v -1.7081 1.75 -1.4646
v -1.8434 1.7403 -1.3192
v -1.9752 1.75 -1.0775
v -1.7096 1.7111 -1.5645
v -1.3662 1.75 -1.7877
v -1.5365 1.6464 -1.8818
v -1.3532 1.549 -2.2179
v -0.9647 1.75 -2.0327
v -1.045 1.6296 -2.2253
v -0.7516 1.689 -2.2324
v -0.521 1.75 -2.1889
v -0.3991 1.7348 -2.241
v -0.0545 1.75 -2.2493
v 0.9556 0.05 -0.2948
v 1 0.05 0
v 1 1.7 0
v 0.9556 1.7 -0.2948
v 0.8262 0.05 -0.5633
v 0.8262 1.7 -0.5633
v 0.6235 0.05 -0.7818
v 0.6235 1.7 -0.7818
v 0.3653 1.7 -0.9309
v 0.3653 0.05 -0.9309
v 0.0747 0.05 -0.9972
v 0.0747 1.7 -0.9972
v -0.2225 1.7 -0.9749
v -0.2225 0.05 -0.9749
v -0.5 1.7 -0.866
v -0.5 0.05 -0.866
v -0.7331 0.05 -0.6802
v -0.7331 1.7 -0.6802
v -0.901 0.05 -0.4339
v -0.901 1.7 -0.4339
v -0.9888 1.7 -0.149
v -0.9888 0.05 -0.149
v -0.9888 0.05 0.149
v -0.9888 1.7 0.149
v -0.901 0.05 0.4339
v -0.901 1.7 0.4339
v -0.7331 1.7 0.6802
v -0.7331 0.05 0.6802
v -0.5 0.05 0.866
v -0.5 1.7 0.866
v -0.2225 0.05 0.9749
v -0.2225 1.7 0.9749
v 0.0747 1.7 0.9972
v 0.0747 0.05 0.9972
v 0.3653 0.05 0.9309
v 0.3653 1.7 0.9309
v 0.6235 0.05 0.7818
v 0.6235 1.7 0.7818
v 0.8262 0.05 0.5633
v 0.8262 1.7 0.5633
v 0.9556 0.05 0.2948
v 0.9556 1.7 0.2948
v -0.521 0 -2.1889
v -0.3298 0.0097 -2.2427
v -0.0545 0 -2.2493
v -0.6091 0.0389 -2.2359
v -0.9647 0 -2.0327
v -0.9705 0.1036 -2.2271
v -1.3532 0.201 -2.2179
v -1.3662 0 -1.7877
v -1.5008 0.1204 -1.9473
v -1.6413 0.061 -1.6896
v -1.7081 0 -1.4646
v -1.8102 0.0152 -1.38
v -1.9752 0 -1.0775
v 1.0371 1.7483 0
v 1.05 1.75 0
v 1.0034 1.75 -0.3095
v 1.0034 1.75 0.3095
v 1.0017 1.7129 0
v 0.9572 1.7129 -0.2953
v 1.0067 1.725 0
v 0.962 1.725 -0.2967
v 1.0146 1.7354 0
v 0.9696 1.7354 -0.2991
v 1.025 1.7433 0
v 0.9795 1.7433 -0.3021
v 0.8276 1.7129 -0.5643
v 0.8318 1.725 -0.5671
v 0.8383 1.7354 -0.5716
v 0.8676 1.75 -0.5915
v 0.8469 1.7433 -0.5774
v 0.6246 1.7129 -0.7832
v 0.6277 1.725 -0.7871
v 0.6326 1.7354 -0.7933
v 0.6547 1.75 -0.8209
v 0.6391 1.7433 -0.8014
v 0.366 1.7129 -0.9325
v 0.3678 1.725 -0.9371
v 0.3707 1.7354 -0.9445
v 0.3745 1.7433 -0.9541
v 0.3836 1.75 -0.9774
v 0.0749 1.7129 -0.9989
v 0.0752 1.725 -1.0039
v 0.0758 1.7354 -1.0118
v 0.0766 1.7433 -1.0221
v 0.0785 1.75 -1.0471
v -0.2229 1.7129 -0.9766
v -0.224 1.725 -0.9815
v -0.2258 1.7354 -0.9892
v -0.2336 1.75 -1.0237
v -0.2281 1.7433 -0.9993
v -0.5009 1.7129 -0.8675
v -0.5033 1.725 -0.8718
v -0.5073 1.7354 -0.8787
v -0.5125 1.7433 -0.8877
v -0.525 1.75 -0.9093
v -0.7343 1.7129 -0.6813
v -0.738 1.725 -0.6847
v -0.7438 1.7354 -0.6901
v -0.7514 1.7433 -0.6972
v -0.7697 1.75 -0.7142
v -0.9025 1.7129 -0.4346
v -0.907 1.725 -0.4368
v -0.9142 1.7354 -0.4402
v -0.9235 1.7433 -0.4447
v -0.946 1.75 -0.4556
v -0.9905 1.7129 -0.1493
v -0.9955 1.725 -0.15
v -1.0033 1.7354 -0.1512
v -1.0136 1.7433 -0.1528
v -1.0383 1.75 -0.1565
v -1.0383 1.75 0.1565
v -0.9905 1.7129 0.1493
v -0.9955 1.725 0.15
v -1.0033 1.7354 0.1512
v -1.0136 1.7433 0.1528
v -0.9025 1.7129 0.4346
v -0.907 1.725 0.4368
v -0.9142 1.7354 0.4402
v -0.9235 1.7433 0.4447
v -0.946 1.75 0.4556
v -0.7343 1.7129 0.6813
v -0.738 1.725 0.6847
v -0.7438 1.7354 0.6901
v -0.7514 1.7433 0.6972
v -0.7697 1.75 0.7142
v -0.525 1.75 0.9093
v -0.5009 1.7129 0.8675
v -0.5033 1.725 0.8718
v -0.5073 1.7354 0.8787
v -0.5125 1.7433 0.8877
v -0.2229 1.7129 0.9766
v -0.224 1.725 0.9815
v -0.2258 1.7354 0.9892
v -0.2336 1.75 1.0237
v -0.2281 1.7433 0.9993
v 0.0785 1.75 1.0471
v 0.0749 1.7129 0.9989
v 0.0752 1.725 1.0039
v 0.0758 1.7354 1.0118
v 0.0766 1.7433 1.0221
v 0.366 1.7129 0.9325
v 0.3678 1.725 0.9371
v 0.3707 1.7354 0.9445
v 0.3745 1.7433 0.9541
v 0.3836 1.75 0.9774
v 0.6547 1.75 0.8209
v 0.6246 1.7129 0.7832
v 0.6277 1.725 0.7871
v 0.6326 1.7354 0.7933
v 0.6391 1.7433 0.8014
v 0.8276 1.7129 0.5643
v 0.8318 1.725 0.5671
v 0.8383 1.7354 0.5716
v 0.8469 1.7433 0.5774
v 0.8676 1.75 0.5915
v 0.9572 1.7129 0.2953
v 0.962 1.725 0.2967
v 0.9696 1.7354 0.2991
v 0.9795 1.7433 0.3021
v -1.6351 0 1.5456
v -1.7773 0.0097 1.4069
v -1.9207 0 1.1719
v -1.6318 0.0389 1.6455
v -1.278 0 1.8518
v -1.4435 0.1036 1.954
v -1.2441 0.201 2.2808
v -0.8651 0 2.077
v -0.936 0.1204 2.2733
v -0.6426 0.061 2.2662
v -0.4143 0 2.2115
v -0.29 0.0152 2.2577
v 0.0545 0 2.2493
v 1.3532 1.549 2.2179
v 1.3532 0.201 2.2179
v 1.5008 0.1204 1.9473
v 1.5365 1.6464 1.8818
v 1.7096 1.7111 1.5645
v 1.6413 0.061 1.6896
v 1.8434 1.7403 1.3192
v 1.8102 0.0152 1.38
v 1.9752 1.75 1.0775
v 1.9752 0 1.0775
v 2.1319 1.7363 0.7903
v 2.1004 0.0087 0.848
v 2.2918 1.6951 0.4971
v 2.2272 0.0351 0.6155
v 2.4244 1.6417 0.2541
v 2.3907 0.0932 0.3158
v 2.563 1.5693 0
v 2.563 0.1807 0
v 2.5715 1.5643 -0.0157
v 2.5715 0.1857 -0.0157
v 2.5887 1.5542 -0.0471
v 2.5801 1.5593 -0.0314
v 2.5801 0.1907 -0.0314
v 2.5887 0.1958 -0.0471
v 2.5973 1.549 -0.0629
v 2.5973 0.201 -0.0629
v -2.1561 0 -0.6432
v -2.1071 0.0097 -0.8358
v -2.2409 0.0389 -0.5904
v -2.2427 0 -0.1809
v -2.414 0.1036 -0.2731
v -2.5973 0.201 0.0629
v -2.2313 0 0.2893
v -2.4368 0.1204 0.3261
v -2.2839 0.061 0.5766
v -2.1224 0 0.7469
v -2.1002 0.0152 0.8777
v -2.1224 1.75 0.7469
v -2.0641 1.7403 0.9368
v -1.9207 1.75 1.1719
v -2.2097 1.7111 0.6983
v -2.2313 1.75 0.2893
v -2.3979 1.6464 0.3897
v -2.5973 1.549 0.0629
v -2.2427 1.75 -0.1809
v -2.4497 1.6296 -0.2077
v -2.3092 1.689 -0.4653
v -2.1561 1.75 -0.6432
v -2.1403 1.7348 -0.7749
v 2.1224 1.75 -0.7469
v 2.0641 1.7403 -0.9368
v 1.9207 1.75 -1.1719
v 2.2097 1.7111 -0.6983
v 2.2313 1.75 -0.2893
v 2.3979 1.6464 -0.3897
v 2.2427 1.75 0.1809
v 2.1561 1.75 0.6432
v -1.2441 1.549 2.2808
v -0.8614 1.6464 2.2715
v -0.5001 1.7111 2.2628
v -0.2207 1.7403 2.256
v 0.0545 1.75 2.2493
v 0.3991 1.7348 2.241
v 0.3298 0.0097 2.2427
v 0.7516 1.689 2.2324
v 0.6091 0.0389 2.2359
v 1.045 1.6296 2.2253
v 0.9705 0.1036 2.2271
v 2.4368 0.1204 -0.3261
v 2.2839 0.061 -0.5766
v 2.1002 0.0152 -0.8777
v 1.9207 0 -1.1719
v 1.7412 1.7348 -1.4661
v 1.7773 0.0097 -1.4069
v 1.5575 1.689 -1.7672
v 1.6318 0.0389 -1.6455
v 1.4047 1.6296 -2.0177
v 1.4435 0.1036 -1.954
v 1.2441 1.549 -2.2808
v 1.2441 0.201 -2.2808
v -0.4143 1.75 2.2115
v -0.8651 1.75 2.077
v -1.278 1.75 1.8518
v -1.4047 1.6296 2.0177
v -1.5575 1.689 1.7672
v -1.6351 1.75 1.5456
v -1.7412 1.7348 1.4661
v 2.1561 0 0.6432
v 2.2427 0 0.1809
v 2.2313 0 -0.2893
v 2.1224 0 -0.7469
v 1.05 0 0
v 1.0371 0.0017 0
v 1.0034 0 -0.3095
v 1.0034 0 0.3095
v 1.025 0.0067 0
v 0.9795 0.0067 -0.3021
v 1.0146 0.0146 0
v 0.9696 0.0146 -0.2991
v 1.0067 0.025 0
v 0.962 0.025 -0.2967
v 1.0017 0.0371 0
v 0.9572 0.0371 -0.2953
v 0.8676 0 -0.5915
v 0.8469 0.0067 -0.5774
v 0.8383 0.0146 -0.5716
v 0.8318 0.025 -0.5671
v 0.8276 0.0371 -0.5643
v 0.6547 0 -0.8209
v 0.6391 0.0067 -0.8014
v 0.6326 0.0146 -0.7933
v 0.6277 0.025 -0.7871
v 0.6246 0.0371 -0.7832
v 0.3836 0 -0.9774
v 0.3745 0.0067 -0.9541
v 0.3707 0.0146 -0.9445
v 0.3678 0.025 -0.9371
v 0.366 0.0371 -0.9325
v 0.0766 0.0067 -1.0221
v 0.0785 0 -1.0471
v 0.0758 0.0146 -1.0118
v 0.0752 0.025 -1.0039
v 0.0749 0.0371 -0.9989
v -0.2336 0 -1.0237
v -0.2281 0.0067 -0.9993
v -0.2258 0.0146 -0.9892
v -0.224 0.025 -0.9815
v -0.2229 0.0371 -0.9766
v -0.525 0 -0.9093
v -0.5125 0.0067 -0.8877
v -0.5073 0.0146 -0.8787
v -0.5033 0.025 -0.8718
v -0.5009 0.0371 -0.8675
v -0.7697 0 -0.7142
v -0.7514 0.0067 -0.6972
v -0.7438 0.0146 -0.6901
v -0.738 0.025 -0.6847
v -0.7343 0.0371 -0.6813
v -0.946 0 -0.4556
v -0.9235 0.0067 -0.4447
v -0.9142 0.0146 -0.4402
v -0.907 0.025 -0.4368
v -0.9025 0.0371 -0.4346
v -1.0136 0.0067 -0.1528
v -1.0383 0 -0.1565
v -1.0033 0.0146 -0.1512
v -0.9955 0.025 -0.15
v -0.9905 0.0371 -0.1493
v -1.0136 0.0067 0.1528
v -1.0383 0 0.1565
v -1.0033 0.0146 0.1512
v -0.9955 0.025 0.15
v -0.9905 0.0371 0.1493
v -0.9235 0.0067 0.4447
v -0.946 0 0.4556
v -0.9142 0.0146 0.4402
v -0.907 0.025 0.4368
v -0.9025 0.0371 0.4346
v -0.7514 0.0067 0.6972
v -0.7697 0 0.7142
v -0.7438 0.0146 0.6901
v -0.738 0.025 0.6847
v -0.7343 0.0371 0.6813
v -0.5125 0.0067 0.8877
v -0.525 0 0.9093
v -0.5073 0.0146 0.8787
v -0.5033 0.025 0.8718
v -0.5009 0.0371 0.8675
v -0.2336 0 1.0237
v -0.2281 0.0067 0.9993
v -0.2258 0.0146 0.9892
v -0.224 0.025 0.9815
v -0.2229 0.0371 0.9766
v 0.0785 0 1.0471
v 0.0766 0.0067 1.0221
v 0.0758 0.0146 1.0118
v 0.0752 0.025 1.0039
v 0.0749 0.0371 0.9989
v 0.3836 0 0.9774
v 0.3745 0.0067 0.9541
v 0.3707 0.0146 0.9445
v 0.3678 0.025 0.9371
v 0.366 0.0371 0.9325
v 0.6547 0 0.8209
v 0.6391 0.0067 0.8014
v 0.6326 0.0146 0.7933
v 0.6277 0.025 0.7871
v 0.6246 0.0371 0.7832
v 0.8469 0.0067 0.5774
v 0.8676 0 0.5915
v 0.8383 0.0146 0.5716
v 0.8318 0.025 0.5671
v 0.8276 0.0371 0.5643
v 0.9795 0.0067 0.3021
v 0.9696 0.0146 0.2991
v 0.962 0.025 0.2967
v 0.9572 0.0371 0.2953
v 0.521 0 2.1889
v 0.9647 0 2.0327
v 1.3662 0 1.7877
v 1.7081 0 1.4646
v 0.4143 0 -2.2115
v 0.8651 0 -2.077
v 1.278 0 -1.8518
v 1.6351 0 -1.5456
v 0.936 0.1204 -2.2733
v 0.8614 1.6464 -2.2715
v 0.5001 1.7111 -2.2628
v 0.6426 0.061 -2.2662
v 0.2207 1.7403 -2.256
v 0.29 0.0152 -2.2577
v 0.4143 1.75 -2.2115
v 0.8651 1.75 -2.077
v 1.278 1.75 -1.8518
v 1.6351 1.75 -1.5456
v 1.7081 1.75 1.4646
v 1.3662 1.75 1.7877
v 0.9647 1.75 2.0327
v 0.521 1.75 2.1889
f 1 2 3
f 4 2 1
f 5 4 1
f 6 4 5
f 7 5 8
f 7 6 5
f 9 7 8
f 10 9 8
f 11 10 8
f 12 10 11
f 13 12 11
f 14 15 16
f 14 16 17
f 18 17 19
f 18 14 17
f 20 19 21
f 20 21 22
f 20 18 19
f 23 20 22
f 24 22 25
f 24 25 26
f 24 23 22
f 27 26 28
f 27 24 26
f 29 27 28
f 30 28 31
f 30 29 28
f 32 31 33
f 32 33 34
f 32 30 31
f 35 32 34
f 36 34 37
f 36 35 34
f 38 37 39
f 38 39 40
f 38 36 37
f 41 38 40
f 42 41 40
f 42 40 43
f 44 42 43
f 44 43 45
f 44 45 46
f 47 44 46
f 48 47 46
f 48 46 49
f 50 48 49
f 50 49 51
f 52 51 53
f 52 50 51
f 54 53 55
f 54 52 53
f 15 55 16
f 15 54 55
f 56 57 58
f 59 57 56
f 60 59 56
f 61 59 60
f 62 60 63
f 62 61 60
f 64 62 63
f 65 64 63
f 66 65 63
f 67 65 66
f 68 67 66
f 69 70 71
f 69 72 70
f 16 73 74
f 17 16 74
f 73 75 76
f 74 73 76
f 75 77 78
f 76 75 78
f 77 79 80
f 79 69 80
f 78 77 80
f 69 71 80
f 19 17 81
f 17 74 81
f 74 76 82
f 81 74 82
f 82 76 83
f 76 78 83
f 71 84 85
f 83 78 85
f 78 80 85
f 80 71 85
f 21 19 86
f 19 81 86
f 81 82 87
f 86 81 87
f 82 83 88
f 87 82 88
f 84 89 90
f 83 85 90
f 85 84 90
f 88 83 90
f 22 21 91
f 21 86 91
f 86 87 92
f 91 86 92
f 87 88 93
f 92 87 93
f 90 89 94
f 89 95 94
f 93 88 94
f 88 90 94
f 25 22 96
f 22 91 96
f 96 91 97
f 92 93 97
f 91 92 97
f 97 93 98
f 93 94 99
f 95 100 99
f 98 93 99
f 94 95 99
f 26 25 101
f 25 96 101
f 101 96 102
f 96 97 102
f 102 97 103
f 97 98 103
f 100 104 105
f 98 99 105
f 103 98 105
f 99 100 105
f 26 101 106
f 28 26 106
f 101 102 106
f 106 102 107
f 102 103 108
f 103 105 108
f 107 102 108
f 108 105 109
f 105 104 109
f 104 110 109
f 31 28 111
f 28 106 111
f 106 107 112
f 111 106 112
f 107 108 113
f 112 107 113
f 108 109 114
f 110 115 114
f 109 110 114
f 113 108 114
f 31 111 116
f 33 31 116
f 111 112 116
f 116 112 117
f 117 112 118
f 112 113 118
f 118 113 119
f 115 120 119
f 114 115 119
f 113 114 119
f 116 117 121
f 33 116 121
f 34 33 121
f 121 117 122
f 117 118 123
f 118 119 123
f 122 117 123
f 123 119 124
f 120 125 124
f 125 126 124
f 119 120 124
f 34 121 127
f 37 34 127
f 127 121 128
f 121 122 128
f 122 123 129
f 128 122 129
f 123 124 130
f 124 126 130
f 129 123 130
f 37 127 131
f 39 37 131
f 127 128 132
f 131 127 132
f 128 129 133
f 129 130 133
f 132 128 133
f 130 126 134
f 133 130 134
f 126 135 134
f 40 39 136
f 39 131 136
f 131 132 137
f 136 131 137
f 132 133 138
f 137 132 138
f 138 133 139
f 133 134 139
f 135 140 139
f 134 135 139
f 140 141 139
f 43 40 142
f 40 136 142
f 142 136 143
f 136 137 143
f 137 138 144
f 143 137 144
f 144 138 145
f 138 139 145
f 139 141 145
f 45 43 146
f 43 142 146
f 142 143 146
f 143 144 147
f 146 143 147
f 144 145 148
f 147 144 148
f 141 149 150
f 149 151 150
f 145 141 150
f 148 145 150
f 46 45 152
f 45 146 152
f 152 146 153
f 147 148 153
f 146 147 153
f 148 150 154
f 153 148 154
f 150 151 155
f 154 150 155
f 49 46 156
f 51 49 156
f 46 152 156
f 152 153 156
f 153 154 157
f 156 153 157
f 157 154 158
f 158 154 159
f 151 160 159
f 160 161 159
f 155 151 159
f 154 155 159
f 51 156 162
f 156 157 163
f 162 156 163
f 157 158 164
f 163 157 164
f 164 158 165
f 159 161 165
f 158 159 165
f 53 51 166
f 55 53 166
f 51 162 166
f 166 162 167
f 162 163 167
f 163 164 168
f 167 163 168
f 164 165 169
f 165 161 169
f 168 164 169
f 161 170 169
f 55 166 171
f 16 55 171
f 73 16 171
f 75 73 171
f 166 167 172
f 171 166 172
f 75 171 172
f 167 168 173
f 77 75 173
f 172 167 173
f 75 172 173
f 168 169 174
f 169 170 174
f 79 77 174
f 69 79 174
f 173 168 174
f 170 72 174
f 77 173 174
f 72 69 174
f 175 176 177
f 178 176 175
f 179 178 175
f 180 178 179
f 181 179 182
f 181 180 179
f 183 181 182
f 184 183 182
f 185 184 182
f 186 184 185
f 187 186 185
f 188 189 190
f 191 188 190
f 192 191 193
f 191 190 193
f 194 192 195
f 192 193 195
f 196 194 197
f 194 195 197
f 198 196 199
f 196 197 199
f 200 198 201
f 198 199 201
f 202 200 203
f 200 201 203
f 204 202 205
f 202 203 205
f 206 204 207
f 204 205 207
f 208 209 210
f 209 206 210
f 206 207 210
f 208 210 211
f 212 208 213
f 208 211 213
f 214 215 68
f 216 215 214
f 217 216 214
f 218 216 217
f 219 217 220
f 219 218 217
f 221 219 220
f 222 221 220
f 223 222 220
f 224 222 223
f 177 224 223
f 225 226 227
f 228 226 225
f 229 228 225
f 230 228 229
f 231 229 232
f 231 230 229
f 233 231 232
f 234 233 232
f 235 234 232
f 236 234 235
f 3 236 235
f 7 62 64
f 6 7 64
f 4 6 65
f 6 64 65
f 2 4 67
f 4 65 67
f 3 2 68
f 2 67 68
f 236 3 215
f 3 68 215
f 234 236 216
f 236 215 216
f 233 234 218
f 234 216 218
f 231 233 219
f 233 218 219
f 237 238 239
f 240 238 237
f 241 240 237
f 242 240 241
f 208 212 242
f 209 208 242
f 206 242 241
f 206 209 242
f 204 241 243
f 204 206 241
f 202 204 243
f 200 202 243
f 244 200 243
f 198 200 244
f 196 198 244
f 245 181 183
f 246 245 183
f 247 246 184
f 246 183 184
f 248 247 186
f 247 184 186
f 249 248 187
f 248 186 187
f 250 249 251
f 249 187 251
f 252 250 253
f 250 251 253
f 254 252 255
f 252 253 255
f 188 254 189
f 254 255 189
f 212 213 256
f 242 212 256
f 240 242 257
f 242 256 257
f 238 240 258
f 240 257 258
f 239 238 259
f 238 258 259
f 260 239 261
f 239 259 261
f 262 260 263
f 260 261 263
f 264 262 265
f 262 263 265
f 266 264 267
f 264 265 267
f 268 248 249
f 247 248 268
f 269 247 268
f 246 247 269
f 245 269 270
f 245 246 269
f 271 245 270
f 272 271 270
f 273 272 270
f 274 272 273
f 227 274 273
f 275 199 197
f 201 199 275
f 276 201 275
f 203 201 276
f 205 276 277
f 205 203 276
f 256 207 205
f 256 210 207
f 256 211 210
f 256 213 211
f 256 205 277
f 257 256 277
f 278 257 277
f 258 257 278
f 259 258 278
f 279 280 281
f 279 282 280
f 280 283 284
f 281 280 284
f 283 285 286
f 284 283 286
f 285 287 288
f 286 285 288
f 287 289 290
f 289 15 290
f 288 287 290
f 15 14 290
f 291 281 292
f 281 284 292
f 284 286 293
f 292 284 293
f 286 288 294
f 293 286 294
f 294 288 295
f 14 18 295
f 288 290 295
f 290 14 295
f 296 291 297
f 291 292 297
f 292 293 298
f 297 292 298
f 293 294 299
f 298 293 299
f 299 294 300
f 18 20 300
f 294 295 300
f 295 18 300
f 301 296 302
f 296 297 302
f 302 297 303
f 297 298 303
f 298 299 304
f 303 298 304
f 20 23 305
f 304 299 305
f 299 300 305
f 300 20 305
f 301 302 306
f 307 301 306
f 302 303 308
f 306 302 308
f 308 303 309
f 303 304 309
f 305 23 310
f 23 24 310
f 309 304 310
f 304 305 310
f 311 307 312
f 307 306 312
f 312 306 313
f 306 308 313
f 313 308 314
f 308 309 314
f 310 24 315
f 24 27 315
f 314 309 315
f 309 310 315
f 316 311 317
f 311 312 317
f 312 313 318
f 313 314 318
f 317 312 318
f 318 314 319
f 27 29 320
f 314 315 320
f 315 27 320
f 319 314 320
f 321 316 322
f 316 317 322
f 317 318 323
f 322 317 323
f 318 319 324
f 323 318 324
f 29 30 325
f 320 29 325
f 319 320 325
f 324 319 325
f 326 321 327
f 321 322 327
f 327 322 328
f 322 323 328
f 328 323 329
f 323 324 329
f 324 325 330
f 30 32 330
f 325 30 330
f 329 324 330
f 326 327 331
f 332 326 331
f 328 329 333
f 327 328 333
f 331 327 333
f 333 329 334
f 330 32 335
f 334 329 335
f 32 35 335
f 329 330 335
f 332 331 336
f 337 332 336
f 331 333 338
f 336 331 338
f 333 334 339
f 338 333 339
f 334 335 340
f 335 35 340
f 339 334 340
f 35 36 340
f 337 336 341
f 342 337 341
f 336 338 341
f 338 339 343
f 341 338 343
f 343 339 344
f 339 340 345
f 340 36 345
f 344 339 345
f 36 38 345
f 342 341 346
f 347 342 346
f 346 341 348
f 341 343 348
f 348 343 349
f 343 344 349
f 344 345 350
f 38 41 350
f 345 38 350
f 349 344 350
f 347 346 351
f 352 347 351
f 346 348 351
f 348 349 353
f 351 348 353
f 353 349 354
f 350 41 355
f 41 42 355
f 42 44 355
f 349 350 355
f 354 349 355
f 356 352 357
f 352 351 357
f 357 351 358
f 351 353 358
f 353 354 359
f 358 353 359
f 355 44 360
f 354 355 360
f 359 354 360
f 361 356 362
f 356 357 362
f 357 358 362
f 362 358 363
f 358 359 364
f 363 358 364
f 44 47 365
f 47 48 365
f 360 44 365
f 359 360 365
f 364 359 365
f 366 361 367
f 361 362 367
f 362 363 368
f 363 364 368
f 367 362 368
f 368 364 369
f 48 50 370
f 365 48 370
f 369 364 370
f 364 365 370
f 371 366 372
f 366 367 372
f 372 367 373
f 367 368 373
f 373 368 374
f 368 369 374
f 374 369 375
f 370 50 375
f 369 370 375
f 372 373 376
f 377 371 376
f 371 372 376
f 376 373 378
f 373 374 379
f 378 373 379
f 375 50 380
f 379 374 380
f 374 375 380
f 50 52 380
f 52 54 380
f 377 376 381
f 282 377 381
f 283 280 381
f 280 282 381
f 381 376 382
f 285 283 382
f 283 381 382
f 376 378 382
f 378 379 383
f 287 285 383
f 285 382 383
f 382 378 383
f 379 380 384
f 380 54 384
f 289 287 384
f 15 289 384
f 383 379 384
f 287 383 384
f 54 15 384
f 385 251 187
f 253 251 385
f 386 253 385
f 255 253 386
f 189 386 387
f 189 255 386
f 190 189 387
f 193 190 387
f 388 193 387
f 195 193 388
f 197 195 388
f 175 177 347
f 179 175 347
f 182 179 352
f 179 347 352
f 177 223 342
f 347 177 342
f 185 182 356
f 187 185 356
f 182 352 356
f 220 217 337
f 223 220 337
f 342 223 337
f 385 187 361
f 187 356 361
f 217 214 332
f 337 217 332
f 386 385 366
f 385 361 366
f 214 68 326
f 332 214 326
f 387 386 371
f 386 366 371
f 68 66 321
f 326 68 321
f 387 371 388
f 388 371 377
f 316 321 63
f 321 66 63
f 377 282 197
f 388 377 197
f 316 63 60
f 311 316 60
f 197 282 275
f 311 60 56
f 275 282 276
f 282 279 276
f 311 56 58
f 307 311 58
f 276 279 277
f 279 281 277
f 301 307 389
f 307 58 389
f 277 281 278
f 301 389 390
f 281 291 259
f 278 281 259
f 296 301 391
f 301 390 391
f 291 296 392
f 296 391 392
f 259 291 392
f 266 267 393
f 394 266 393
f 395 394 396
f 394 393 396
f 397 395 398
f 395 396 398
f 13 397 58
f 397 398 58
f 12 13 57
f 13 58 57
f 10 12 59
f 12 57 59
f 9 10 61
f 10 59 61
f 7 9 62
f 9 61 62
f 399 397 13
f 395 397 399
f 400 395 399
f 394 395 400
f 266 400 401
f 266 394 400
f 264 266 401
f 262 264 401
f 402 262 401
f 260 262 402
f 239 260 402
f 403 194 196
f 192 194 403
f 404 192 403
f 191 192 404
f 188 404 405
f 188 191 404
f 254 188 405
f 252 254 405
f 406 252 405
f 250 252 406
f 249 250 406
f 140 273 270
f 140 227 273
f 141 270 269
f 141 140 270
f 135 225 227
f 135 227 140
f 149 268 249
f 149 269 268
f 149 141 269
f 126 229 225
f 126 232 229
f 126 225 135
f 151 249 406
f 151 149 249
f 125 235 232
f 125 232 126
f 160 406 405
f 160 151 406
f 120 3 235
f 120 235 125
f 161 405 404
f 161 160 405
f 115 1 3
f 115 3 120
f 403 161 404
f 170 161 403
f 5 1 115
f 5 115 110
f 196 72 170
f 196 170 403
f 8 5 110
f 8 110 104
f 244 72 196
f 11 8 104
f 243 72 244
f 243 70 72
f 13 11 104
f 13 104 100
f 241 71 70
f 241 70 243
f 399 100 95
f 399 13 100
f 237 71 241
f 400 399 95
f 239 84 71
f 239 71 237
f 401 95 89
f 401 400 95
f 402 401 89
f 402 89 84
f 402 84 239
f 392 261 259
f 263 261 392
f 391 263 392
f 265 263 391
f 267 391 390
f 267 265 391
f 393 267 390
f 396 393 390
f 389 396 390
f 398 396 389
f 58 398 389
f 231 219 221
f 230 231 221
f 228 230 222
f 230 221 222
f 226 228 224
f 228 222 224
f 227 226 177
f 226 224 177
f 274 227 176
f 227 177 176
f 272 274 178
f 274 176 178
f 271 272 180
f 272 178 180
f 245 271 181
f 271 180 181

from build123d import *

# Parameters (mm, degrees)
SKETCH1_R           = 1
BOSS_EXTRUDE1_DEPTH = 1.75
SKETCH3_OUTSIDE_W   = 14.682
SKETCH3_OUTSIDE_H   = 14.05
SKETCH3_OUTSIDE_R   = 2.25
CUT_EXTRUDE2_DEPTH  = 1.75
CUT_EXTRUDE2_TAPER  = 60
SKETCH4_OUTSIDE_W   = 14.682
SKETCH4_OUTSIDE_H   = 14.05
SKETCH4_OUTSIDE_R   = 2.25
CUT_EXTRUDE3_DEPTH  = 1.75
CUT_EXTRUDE3_TAPER  = 60
FILLET1_R           = 0.05


with BuildPart() as part:
    # Sketch1 → Boss-Extrude1 (new body)
    with BuildSketch(Plane(origin=(0, 0, 0), x_dir=(1, 0, 0), z_dir=(0, 1, 0))):
        Polygon((1.353165533, -2.217869032), (2.59731369, 0.062941211), (1.244148157, 2.280810243), (-1.353165533, 2.217869032), (-2.59731369, -0.062941211), (-1.244148157, -2.280810243), align=None)
        Circle(SKETCH1_R, mode=Mode.SUBTRACT)
    extrude(amount=BOSS_EXTRUDE1_DEPTH)

    # Sketch3 outside → Cut-Extrude2 (cut)
    with BuildSketch(Plane(origin=(0, 1.75, 0), x_dir=(1, 0, 0), z_dir=(0, 1, 0))):
        Rectangle(SKETCH3_OUTSIDE_W, SKETCH3_OUTSIDE_H)
        Circle(SKETCH3_OUTSIDE_R, mode=Mode.SUBTRACT)
    extrude(amount=-CUT_EXTRUDE2_DEPTH, taper=CUT_EXTRUDE2_TAPER, mode=Mode.SUBTRACT)

    # Sketch4 outside → Cut-Extrude3 (cut)
    with BuildSketch(Plane.XZ):
        Rectangle(SKETCH4_OUTSIDE_W, SKETCH4_OUTSIDE_H)
        Circle(SKETCH4_OUTSIDE_R, mode=Mode.SUBTRACT)
    extrude(amount=-CUT_EXTRUDE3_DEPTH, taper=CUT_EXTRUDE3_TAPER, mode=Mode.SUBTRACT)

    # Fillet1
    fillet1_edges = [part.edges().sort_by_distance(p)[0] for p in [
        (-1, 0, 0),
        (-1, 1.75, 0),
    ]]
    fillet(fillet1_edges, radius=FILLET1_R)


solid = part.part
